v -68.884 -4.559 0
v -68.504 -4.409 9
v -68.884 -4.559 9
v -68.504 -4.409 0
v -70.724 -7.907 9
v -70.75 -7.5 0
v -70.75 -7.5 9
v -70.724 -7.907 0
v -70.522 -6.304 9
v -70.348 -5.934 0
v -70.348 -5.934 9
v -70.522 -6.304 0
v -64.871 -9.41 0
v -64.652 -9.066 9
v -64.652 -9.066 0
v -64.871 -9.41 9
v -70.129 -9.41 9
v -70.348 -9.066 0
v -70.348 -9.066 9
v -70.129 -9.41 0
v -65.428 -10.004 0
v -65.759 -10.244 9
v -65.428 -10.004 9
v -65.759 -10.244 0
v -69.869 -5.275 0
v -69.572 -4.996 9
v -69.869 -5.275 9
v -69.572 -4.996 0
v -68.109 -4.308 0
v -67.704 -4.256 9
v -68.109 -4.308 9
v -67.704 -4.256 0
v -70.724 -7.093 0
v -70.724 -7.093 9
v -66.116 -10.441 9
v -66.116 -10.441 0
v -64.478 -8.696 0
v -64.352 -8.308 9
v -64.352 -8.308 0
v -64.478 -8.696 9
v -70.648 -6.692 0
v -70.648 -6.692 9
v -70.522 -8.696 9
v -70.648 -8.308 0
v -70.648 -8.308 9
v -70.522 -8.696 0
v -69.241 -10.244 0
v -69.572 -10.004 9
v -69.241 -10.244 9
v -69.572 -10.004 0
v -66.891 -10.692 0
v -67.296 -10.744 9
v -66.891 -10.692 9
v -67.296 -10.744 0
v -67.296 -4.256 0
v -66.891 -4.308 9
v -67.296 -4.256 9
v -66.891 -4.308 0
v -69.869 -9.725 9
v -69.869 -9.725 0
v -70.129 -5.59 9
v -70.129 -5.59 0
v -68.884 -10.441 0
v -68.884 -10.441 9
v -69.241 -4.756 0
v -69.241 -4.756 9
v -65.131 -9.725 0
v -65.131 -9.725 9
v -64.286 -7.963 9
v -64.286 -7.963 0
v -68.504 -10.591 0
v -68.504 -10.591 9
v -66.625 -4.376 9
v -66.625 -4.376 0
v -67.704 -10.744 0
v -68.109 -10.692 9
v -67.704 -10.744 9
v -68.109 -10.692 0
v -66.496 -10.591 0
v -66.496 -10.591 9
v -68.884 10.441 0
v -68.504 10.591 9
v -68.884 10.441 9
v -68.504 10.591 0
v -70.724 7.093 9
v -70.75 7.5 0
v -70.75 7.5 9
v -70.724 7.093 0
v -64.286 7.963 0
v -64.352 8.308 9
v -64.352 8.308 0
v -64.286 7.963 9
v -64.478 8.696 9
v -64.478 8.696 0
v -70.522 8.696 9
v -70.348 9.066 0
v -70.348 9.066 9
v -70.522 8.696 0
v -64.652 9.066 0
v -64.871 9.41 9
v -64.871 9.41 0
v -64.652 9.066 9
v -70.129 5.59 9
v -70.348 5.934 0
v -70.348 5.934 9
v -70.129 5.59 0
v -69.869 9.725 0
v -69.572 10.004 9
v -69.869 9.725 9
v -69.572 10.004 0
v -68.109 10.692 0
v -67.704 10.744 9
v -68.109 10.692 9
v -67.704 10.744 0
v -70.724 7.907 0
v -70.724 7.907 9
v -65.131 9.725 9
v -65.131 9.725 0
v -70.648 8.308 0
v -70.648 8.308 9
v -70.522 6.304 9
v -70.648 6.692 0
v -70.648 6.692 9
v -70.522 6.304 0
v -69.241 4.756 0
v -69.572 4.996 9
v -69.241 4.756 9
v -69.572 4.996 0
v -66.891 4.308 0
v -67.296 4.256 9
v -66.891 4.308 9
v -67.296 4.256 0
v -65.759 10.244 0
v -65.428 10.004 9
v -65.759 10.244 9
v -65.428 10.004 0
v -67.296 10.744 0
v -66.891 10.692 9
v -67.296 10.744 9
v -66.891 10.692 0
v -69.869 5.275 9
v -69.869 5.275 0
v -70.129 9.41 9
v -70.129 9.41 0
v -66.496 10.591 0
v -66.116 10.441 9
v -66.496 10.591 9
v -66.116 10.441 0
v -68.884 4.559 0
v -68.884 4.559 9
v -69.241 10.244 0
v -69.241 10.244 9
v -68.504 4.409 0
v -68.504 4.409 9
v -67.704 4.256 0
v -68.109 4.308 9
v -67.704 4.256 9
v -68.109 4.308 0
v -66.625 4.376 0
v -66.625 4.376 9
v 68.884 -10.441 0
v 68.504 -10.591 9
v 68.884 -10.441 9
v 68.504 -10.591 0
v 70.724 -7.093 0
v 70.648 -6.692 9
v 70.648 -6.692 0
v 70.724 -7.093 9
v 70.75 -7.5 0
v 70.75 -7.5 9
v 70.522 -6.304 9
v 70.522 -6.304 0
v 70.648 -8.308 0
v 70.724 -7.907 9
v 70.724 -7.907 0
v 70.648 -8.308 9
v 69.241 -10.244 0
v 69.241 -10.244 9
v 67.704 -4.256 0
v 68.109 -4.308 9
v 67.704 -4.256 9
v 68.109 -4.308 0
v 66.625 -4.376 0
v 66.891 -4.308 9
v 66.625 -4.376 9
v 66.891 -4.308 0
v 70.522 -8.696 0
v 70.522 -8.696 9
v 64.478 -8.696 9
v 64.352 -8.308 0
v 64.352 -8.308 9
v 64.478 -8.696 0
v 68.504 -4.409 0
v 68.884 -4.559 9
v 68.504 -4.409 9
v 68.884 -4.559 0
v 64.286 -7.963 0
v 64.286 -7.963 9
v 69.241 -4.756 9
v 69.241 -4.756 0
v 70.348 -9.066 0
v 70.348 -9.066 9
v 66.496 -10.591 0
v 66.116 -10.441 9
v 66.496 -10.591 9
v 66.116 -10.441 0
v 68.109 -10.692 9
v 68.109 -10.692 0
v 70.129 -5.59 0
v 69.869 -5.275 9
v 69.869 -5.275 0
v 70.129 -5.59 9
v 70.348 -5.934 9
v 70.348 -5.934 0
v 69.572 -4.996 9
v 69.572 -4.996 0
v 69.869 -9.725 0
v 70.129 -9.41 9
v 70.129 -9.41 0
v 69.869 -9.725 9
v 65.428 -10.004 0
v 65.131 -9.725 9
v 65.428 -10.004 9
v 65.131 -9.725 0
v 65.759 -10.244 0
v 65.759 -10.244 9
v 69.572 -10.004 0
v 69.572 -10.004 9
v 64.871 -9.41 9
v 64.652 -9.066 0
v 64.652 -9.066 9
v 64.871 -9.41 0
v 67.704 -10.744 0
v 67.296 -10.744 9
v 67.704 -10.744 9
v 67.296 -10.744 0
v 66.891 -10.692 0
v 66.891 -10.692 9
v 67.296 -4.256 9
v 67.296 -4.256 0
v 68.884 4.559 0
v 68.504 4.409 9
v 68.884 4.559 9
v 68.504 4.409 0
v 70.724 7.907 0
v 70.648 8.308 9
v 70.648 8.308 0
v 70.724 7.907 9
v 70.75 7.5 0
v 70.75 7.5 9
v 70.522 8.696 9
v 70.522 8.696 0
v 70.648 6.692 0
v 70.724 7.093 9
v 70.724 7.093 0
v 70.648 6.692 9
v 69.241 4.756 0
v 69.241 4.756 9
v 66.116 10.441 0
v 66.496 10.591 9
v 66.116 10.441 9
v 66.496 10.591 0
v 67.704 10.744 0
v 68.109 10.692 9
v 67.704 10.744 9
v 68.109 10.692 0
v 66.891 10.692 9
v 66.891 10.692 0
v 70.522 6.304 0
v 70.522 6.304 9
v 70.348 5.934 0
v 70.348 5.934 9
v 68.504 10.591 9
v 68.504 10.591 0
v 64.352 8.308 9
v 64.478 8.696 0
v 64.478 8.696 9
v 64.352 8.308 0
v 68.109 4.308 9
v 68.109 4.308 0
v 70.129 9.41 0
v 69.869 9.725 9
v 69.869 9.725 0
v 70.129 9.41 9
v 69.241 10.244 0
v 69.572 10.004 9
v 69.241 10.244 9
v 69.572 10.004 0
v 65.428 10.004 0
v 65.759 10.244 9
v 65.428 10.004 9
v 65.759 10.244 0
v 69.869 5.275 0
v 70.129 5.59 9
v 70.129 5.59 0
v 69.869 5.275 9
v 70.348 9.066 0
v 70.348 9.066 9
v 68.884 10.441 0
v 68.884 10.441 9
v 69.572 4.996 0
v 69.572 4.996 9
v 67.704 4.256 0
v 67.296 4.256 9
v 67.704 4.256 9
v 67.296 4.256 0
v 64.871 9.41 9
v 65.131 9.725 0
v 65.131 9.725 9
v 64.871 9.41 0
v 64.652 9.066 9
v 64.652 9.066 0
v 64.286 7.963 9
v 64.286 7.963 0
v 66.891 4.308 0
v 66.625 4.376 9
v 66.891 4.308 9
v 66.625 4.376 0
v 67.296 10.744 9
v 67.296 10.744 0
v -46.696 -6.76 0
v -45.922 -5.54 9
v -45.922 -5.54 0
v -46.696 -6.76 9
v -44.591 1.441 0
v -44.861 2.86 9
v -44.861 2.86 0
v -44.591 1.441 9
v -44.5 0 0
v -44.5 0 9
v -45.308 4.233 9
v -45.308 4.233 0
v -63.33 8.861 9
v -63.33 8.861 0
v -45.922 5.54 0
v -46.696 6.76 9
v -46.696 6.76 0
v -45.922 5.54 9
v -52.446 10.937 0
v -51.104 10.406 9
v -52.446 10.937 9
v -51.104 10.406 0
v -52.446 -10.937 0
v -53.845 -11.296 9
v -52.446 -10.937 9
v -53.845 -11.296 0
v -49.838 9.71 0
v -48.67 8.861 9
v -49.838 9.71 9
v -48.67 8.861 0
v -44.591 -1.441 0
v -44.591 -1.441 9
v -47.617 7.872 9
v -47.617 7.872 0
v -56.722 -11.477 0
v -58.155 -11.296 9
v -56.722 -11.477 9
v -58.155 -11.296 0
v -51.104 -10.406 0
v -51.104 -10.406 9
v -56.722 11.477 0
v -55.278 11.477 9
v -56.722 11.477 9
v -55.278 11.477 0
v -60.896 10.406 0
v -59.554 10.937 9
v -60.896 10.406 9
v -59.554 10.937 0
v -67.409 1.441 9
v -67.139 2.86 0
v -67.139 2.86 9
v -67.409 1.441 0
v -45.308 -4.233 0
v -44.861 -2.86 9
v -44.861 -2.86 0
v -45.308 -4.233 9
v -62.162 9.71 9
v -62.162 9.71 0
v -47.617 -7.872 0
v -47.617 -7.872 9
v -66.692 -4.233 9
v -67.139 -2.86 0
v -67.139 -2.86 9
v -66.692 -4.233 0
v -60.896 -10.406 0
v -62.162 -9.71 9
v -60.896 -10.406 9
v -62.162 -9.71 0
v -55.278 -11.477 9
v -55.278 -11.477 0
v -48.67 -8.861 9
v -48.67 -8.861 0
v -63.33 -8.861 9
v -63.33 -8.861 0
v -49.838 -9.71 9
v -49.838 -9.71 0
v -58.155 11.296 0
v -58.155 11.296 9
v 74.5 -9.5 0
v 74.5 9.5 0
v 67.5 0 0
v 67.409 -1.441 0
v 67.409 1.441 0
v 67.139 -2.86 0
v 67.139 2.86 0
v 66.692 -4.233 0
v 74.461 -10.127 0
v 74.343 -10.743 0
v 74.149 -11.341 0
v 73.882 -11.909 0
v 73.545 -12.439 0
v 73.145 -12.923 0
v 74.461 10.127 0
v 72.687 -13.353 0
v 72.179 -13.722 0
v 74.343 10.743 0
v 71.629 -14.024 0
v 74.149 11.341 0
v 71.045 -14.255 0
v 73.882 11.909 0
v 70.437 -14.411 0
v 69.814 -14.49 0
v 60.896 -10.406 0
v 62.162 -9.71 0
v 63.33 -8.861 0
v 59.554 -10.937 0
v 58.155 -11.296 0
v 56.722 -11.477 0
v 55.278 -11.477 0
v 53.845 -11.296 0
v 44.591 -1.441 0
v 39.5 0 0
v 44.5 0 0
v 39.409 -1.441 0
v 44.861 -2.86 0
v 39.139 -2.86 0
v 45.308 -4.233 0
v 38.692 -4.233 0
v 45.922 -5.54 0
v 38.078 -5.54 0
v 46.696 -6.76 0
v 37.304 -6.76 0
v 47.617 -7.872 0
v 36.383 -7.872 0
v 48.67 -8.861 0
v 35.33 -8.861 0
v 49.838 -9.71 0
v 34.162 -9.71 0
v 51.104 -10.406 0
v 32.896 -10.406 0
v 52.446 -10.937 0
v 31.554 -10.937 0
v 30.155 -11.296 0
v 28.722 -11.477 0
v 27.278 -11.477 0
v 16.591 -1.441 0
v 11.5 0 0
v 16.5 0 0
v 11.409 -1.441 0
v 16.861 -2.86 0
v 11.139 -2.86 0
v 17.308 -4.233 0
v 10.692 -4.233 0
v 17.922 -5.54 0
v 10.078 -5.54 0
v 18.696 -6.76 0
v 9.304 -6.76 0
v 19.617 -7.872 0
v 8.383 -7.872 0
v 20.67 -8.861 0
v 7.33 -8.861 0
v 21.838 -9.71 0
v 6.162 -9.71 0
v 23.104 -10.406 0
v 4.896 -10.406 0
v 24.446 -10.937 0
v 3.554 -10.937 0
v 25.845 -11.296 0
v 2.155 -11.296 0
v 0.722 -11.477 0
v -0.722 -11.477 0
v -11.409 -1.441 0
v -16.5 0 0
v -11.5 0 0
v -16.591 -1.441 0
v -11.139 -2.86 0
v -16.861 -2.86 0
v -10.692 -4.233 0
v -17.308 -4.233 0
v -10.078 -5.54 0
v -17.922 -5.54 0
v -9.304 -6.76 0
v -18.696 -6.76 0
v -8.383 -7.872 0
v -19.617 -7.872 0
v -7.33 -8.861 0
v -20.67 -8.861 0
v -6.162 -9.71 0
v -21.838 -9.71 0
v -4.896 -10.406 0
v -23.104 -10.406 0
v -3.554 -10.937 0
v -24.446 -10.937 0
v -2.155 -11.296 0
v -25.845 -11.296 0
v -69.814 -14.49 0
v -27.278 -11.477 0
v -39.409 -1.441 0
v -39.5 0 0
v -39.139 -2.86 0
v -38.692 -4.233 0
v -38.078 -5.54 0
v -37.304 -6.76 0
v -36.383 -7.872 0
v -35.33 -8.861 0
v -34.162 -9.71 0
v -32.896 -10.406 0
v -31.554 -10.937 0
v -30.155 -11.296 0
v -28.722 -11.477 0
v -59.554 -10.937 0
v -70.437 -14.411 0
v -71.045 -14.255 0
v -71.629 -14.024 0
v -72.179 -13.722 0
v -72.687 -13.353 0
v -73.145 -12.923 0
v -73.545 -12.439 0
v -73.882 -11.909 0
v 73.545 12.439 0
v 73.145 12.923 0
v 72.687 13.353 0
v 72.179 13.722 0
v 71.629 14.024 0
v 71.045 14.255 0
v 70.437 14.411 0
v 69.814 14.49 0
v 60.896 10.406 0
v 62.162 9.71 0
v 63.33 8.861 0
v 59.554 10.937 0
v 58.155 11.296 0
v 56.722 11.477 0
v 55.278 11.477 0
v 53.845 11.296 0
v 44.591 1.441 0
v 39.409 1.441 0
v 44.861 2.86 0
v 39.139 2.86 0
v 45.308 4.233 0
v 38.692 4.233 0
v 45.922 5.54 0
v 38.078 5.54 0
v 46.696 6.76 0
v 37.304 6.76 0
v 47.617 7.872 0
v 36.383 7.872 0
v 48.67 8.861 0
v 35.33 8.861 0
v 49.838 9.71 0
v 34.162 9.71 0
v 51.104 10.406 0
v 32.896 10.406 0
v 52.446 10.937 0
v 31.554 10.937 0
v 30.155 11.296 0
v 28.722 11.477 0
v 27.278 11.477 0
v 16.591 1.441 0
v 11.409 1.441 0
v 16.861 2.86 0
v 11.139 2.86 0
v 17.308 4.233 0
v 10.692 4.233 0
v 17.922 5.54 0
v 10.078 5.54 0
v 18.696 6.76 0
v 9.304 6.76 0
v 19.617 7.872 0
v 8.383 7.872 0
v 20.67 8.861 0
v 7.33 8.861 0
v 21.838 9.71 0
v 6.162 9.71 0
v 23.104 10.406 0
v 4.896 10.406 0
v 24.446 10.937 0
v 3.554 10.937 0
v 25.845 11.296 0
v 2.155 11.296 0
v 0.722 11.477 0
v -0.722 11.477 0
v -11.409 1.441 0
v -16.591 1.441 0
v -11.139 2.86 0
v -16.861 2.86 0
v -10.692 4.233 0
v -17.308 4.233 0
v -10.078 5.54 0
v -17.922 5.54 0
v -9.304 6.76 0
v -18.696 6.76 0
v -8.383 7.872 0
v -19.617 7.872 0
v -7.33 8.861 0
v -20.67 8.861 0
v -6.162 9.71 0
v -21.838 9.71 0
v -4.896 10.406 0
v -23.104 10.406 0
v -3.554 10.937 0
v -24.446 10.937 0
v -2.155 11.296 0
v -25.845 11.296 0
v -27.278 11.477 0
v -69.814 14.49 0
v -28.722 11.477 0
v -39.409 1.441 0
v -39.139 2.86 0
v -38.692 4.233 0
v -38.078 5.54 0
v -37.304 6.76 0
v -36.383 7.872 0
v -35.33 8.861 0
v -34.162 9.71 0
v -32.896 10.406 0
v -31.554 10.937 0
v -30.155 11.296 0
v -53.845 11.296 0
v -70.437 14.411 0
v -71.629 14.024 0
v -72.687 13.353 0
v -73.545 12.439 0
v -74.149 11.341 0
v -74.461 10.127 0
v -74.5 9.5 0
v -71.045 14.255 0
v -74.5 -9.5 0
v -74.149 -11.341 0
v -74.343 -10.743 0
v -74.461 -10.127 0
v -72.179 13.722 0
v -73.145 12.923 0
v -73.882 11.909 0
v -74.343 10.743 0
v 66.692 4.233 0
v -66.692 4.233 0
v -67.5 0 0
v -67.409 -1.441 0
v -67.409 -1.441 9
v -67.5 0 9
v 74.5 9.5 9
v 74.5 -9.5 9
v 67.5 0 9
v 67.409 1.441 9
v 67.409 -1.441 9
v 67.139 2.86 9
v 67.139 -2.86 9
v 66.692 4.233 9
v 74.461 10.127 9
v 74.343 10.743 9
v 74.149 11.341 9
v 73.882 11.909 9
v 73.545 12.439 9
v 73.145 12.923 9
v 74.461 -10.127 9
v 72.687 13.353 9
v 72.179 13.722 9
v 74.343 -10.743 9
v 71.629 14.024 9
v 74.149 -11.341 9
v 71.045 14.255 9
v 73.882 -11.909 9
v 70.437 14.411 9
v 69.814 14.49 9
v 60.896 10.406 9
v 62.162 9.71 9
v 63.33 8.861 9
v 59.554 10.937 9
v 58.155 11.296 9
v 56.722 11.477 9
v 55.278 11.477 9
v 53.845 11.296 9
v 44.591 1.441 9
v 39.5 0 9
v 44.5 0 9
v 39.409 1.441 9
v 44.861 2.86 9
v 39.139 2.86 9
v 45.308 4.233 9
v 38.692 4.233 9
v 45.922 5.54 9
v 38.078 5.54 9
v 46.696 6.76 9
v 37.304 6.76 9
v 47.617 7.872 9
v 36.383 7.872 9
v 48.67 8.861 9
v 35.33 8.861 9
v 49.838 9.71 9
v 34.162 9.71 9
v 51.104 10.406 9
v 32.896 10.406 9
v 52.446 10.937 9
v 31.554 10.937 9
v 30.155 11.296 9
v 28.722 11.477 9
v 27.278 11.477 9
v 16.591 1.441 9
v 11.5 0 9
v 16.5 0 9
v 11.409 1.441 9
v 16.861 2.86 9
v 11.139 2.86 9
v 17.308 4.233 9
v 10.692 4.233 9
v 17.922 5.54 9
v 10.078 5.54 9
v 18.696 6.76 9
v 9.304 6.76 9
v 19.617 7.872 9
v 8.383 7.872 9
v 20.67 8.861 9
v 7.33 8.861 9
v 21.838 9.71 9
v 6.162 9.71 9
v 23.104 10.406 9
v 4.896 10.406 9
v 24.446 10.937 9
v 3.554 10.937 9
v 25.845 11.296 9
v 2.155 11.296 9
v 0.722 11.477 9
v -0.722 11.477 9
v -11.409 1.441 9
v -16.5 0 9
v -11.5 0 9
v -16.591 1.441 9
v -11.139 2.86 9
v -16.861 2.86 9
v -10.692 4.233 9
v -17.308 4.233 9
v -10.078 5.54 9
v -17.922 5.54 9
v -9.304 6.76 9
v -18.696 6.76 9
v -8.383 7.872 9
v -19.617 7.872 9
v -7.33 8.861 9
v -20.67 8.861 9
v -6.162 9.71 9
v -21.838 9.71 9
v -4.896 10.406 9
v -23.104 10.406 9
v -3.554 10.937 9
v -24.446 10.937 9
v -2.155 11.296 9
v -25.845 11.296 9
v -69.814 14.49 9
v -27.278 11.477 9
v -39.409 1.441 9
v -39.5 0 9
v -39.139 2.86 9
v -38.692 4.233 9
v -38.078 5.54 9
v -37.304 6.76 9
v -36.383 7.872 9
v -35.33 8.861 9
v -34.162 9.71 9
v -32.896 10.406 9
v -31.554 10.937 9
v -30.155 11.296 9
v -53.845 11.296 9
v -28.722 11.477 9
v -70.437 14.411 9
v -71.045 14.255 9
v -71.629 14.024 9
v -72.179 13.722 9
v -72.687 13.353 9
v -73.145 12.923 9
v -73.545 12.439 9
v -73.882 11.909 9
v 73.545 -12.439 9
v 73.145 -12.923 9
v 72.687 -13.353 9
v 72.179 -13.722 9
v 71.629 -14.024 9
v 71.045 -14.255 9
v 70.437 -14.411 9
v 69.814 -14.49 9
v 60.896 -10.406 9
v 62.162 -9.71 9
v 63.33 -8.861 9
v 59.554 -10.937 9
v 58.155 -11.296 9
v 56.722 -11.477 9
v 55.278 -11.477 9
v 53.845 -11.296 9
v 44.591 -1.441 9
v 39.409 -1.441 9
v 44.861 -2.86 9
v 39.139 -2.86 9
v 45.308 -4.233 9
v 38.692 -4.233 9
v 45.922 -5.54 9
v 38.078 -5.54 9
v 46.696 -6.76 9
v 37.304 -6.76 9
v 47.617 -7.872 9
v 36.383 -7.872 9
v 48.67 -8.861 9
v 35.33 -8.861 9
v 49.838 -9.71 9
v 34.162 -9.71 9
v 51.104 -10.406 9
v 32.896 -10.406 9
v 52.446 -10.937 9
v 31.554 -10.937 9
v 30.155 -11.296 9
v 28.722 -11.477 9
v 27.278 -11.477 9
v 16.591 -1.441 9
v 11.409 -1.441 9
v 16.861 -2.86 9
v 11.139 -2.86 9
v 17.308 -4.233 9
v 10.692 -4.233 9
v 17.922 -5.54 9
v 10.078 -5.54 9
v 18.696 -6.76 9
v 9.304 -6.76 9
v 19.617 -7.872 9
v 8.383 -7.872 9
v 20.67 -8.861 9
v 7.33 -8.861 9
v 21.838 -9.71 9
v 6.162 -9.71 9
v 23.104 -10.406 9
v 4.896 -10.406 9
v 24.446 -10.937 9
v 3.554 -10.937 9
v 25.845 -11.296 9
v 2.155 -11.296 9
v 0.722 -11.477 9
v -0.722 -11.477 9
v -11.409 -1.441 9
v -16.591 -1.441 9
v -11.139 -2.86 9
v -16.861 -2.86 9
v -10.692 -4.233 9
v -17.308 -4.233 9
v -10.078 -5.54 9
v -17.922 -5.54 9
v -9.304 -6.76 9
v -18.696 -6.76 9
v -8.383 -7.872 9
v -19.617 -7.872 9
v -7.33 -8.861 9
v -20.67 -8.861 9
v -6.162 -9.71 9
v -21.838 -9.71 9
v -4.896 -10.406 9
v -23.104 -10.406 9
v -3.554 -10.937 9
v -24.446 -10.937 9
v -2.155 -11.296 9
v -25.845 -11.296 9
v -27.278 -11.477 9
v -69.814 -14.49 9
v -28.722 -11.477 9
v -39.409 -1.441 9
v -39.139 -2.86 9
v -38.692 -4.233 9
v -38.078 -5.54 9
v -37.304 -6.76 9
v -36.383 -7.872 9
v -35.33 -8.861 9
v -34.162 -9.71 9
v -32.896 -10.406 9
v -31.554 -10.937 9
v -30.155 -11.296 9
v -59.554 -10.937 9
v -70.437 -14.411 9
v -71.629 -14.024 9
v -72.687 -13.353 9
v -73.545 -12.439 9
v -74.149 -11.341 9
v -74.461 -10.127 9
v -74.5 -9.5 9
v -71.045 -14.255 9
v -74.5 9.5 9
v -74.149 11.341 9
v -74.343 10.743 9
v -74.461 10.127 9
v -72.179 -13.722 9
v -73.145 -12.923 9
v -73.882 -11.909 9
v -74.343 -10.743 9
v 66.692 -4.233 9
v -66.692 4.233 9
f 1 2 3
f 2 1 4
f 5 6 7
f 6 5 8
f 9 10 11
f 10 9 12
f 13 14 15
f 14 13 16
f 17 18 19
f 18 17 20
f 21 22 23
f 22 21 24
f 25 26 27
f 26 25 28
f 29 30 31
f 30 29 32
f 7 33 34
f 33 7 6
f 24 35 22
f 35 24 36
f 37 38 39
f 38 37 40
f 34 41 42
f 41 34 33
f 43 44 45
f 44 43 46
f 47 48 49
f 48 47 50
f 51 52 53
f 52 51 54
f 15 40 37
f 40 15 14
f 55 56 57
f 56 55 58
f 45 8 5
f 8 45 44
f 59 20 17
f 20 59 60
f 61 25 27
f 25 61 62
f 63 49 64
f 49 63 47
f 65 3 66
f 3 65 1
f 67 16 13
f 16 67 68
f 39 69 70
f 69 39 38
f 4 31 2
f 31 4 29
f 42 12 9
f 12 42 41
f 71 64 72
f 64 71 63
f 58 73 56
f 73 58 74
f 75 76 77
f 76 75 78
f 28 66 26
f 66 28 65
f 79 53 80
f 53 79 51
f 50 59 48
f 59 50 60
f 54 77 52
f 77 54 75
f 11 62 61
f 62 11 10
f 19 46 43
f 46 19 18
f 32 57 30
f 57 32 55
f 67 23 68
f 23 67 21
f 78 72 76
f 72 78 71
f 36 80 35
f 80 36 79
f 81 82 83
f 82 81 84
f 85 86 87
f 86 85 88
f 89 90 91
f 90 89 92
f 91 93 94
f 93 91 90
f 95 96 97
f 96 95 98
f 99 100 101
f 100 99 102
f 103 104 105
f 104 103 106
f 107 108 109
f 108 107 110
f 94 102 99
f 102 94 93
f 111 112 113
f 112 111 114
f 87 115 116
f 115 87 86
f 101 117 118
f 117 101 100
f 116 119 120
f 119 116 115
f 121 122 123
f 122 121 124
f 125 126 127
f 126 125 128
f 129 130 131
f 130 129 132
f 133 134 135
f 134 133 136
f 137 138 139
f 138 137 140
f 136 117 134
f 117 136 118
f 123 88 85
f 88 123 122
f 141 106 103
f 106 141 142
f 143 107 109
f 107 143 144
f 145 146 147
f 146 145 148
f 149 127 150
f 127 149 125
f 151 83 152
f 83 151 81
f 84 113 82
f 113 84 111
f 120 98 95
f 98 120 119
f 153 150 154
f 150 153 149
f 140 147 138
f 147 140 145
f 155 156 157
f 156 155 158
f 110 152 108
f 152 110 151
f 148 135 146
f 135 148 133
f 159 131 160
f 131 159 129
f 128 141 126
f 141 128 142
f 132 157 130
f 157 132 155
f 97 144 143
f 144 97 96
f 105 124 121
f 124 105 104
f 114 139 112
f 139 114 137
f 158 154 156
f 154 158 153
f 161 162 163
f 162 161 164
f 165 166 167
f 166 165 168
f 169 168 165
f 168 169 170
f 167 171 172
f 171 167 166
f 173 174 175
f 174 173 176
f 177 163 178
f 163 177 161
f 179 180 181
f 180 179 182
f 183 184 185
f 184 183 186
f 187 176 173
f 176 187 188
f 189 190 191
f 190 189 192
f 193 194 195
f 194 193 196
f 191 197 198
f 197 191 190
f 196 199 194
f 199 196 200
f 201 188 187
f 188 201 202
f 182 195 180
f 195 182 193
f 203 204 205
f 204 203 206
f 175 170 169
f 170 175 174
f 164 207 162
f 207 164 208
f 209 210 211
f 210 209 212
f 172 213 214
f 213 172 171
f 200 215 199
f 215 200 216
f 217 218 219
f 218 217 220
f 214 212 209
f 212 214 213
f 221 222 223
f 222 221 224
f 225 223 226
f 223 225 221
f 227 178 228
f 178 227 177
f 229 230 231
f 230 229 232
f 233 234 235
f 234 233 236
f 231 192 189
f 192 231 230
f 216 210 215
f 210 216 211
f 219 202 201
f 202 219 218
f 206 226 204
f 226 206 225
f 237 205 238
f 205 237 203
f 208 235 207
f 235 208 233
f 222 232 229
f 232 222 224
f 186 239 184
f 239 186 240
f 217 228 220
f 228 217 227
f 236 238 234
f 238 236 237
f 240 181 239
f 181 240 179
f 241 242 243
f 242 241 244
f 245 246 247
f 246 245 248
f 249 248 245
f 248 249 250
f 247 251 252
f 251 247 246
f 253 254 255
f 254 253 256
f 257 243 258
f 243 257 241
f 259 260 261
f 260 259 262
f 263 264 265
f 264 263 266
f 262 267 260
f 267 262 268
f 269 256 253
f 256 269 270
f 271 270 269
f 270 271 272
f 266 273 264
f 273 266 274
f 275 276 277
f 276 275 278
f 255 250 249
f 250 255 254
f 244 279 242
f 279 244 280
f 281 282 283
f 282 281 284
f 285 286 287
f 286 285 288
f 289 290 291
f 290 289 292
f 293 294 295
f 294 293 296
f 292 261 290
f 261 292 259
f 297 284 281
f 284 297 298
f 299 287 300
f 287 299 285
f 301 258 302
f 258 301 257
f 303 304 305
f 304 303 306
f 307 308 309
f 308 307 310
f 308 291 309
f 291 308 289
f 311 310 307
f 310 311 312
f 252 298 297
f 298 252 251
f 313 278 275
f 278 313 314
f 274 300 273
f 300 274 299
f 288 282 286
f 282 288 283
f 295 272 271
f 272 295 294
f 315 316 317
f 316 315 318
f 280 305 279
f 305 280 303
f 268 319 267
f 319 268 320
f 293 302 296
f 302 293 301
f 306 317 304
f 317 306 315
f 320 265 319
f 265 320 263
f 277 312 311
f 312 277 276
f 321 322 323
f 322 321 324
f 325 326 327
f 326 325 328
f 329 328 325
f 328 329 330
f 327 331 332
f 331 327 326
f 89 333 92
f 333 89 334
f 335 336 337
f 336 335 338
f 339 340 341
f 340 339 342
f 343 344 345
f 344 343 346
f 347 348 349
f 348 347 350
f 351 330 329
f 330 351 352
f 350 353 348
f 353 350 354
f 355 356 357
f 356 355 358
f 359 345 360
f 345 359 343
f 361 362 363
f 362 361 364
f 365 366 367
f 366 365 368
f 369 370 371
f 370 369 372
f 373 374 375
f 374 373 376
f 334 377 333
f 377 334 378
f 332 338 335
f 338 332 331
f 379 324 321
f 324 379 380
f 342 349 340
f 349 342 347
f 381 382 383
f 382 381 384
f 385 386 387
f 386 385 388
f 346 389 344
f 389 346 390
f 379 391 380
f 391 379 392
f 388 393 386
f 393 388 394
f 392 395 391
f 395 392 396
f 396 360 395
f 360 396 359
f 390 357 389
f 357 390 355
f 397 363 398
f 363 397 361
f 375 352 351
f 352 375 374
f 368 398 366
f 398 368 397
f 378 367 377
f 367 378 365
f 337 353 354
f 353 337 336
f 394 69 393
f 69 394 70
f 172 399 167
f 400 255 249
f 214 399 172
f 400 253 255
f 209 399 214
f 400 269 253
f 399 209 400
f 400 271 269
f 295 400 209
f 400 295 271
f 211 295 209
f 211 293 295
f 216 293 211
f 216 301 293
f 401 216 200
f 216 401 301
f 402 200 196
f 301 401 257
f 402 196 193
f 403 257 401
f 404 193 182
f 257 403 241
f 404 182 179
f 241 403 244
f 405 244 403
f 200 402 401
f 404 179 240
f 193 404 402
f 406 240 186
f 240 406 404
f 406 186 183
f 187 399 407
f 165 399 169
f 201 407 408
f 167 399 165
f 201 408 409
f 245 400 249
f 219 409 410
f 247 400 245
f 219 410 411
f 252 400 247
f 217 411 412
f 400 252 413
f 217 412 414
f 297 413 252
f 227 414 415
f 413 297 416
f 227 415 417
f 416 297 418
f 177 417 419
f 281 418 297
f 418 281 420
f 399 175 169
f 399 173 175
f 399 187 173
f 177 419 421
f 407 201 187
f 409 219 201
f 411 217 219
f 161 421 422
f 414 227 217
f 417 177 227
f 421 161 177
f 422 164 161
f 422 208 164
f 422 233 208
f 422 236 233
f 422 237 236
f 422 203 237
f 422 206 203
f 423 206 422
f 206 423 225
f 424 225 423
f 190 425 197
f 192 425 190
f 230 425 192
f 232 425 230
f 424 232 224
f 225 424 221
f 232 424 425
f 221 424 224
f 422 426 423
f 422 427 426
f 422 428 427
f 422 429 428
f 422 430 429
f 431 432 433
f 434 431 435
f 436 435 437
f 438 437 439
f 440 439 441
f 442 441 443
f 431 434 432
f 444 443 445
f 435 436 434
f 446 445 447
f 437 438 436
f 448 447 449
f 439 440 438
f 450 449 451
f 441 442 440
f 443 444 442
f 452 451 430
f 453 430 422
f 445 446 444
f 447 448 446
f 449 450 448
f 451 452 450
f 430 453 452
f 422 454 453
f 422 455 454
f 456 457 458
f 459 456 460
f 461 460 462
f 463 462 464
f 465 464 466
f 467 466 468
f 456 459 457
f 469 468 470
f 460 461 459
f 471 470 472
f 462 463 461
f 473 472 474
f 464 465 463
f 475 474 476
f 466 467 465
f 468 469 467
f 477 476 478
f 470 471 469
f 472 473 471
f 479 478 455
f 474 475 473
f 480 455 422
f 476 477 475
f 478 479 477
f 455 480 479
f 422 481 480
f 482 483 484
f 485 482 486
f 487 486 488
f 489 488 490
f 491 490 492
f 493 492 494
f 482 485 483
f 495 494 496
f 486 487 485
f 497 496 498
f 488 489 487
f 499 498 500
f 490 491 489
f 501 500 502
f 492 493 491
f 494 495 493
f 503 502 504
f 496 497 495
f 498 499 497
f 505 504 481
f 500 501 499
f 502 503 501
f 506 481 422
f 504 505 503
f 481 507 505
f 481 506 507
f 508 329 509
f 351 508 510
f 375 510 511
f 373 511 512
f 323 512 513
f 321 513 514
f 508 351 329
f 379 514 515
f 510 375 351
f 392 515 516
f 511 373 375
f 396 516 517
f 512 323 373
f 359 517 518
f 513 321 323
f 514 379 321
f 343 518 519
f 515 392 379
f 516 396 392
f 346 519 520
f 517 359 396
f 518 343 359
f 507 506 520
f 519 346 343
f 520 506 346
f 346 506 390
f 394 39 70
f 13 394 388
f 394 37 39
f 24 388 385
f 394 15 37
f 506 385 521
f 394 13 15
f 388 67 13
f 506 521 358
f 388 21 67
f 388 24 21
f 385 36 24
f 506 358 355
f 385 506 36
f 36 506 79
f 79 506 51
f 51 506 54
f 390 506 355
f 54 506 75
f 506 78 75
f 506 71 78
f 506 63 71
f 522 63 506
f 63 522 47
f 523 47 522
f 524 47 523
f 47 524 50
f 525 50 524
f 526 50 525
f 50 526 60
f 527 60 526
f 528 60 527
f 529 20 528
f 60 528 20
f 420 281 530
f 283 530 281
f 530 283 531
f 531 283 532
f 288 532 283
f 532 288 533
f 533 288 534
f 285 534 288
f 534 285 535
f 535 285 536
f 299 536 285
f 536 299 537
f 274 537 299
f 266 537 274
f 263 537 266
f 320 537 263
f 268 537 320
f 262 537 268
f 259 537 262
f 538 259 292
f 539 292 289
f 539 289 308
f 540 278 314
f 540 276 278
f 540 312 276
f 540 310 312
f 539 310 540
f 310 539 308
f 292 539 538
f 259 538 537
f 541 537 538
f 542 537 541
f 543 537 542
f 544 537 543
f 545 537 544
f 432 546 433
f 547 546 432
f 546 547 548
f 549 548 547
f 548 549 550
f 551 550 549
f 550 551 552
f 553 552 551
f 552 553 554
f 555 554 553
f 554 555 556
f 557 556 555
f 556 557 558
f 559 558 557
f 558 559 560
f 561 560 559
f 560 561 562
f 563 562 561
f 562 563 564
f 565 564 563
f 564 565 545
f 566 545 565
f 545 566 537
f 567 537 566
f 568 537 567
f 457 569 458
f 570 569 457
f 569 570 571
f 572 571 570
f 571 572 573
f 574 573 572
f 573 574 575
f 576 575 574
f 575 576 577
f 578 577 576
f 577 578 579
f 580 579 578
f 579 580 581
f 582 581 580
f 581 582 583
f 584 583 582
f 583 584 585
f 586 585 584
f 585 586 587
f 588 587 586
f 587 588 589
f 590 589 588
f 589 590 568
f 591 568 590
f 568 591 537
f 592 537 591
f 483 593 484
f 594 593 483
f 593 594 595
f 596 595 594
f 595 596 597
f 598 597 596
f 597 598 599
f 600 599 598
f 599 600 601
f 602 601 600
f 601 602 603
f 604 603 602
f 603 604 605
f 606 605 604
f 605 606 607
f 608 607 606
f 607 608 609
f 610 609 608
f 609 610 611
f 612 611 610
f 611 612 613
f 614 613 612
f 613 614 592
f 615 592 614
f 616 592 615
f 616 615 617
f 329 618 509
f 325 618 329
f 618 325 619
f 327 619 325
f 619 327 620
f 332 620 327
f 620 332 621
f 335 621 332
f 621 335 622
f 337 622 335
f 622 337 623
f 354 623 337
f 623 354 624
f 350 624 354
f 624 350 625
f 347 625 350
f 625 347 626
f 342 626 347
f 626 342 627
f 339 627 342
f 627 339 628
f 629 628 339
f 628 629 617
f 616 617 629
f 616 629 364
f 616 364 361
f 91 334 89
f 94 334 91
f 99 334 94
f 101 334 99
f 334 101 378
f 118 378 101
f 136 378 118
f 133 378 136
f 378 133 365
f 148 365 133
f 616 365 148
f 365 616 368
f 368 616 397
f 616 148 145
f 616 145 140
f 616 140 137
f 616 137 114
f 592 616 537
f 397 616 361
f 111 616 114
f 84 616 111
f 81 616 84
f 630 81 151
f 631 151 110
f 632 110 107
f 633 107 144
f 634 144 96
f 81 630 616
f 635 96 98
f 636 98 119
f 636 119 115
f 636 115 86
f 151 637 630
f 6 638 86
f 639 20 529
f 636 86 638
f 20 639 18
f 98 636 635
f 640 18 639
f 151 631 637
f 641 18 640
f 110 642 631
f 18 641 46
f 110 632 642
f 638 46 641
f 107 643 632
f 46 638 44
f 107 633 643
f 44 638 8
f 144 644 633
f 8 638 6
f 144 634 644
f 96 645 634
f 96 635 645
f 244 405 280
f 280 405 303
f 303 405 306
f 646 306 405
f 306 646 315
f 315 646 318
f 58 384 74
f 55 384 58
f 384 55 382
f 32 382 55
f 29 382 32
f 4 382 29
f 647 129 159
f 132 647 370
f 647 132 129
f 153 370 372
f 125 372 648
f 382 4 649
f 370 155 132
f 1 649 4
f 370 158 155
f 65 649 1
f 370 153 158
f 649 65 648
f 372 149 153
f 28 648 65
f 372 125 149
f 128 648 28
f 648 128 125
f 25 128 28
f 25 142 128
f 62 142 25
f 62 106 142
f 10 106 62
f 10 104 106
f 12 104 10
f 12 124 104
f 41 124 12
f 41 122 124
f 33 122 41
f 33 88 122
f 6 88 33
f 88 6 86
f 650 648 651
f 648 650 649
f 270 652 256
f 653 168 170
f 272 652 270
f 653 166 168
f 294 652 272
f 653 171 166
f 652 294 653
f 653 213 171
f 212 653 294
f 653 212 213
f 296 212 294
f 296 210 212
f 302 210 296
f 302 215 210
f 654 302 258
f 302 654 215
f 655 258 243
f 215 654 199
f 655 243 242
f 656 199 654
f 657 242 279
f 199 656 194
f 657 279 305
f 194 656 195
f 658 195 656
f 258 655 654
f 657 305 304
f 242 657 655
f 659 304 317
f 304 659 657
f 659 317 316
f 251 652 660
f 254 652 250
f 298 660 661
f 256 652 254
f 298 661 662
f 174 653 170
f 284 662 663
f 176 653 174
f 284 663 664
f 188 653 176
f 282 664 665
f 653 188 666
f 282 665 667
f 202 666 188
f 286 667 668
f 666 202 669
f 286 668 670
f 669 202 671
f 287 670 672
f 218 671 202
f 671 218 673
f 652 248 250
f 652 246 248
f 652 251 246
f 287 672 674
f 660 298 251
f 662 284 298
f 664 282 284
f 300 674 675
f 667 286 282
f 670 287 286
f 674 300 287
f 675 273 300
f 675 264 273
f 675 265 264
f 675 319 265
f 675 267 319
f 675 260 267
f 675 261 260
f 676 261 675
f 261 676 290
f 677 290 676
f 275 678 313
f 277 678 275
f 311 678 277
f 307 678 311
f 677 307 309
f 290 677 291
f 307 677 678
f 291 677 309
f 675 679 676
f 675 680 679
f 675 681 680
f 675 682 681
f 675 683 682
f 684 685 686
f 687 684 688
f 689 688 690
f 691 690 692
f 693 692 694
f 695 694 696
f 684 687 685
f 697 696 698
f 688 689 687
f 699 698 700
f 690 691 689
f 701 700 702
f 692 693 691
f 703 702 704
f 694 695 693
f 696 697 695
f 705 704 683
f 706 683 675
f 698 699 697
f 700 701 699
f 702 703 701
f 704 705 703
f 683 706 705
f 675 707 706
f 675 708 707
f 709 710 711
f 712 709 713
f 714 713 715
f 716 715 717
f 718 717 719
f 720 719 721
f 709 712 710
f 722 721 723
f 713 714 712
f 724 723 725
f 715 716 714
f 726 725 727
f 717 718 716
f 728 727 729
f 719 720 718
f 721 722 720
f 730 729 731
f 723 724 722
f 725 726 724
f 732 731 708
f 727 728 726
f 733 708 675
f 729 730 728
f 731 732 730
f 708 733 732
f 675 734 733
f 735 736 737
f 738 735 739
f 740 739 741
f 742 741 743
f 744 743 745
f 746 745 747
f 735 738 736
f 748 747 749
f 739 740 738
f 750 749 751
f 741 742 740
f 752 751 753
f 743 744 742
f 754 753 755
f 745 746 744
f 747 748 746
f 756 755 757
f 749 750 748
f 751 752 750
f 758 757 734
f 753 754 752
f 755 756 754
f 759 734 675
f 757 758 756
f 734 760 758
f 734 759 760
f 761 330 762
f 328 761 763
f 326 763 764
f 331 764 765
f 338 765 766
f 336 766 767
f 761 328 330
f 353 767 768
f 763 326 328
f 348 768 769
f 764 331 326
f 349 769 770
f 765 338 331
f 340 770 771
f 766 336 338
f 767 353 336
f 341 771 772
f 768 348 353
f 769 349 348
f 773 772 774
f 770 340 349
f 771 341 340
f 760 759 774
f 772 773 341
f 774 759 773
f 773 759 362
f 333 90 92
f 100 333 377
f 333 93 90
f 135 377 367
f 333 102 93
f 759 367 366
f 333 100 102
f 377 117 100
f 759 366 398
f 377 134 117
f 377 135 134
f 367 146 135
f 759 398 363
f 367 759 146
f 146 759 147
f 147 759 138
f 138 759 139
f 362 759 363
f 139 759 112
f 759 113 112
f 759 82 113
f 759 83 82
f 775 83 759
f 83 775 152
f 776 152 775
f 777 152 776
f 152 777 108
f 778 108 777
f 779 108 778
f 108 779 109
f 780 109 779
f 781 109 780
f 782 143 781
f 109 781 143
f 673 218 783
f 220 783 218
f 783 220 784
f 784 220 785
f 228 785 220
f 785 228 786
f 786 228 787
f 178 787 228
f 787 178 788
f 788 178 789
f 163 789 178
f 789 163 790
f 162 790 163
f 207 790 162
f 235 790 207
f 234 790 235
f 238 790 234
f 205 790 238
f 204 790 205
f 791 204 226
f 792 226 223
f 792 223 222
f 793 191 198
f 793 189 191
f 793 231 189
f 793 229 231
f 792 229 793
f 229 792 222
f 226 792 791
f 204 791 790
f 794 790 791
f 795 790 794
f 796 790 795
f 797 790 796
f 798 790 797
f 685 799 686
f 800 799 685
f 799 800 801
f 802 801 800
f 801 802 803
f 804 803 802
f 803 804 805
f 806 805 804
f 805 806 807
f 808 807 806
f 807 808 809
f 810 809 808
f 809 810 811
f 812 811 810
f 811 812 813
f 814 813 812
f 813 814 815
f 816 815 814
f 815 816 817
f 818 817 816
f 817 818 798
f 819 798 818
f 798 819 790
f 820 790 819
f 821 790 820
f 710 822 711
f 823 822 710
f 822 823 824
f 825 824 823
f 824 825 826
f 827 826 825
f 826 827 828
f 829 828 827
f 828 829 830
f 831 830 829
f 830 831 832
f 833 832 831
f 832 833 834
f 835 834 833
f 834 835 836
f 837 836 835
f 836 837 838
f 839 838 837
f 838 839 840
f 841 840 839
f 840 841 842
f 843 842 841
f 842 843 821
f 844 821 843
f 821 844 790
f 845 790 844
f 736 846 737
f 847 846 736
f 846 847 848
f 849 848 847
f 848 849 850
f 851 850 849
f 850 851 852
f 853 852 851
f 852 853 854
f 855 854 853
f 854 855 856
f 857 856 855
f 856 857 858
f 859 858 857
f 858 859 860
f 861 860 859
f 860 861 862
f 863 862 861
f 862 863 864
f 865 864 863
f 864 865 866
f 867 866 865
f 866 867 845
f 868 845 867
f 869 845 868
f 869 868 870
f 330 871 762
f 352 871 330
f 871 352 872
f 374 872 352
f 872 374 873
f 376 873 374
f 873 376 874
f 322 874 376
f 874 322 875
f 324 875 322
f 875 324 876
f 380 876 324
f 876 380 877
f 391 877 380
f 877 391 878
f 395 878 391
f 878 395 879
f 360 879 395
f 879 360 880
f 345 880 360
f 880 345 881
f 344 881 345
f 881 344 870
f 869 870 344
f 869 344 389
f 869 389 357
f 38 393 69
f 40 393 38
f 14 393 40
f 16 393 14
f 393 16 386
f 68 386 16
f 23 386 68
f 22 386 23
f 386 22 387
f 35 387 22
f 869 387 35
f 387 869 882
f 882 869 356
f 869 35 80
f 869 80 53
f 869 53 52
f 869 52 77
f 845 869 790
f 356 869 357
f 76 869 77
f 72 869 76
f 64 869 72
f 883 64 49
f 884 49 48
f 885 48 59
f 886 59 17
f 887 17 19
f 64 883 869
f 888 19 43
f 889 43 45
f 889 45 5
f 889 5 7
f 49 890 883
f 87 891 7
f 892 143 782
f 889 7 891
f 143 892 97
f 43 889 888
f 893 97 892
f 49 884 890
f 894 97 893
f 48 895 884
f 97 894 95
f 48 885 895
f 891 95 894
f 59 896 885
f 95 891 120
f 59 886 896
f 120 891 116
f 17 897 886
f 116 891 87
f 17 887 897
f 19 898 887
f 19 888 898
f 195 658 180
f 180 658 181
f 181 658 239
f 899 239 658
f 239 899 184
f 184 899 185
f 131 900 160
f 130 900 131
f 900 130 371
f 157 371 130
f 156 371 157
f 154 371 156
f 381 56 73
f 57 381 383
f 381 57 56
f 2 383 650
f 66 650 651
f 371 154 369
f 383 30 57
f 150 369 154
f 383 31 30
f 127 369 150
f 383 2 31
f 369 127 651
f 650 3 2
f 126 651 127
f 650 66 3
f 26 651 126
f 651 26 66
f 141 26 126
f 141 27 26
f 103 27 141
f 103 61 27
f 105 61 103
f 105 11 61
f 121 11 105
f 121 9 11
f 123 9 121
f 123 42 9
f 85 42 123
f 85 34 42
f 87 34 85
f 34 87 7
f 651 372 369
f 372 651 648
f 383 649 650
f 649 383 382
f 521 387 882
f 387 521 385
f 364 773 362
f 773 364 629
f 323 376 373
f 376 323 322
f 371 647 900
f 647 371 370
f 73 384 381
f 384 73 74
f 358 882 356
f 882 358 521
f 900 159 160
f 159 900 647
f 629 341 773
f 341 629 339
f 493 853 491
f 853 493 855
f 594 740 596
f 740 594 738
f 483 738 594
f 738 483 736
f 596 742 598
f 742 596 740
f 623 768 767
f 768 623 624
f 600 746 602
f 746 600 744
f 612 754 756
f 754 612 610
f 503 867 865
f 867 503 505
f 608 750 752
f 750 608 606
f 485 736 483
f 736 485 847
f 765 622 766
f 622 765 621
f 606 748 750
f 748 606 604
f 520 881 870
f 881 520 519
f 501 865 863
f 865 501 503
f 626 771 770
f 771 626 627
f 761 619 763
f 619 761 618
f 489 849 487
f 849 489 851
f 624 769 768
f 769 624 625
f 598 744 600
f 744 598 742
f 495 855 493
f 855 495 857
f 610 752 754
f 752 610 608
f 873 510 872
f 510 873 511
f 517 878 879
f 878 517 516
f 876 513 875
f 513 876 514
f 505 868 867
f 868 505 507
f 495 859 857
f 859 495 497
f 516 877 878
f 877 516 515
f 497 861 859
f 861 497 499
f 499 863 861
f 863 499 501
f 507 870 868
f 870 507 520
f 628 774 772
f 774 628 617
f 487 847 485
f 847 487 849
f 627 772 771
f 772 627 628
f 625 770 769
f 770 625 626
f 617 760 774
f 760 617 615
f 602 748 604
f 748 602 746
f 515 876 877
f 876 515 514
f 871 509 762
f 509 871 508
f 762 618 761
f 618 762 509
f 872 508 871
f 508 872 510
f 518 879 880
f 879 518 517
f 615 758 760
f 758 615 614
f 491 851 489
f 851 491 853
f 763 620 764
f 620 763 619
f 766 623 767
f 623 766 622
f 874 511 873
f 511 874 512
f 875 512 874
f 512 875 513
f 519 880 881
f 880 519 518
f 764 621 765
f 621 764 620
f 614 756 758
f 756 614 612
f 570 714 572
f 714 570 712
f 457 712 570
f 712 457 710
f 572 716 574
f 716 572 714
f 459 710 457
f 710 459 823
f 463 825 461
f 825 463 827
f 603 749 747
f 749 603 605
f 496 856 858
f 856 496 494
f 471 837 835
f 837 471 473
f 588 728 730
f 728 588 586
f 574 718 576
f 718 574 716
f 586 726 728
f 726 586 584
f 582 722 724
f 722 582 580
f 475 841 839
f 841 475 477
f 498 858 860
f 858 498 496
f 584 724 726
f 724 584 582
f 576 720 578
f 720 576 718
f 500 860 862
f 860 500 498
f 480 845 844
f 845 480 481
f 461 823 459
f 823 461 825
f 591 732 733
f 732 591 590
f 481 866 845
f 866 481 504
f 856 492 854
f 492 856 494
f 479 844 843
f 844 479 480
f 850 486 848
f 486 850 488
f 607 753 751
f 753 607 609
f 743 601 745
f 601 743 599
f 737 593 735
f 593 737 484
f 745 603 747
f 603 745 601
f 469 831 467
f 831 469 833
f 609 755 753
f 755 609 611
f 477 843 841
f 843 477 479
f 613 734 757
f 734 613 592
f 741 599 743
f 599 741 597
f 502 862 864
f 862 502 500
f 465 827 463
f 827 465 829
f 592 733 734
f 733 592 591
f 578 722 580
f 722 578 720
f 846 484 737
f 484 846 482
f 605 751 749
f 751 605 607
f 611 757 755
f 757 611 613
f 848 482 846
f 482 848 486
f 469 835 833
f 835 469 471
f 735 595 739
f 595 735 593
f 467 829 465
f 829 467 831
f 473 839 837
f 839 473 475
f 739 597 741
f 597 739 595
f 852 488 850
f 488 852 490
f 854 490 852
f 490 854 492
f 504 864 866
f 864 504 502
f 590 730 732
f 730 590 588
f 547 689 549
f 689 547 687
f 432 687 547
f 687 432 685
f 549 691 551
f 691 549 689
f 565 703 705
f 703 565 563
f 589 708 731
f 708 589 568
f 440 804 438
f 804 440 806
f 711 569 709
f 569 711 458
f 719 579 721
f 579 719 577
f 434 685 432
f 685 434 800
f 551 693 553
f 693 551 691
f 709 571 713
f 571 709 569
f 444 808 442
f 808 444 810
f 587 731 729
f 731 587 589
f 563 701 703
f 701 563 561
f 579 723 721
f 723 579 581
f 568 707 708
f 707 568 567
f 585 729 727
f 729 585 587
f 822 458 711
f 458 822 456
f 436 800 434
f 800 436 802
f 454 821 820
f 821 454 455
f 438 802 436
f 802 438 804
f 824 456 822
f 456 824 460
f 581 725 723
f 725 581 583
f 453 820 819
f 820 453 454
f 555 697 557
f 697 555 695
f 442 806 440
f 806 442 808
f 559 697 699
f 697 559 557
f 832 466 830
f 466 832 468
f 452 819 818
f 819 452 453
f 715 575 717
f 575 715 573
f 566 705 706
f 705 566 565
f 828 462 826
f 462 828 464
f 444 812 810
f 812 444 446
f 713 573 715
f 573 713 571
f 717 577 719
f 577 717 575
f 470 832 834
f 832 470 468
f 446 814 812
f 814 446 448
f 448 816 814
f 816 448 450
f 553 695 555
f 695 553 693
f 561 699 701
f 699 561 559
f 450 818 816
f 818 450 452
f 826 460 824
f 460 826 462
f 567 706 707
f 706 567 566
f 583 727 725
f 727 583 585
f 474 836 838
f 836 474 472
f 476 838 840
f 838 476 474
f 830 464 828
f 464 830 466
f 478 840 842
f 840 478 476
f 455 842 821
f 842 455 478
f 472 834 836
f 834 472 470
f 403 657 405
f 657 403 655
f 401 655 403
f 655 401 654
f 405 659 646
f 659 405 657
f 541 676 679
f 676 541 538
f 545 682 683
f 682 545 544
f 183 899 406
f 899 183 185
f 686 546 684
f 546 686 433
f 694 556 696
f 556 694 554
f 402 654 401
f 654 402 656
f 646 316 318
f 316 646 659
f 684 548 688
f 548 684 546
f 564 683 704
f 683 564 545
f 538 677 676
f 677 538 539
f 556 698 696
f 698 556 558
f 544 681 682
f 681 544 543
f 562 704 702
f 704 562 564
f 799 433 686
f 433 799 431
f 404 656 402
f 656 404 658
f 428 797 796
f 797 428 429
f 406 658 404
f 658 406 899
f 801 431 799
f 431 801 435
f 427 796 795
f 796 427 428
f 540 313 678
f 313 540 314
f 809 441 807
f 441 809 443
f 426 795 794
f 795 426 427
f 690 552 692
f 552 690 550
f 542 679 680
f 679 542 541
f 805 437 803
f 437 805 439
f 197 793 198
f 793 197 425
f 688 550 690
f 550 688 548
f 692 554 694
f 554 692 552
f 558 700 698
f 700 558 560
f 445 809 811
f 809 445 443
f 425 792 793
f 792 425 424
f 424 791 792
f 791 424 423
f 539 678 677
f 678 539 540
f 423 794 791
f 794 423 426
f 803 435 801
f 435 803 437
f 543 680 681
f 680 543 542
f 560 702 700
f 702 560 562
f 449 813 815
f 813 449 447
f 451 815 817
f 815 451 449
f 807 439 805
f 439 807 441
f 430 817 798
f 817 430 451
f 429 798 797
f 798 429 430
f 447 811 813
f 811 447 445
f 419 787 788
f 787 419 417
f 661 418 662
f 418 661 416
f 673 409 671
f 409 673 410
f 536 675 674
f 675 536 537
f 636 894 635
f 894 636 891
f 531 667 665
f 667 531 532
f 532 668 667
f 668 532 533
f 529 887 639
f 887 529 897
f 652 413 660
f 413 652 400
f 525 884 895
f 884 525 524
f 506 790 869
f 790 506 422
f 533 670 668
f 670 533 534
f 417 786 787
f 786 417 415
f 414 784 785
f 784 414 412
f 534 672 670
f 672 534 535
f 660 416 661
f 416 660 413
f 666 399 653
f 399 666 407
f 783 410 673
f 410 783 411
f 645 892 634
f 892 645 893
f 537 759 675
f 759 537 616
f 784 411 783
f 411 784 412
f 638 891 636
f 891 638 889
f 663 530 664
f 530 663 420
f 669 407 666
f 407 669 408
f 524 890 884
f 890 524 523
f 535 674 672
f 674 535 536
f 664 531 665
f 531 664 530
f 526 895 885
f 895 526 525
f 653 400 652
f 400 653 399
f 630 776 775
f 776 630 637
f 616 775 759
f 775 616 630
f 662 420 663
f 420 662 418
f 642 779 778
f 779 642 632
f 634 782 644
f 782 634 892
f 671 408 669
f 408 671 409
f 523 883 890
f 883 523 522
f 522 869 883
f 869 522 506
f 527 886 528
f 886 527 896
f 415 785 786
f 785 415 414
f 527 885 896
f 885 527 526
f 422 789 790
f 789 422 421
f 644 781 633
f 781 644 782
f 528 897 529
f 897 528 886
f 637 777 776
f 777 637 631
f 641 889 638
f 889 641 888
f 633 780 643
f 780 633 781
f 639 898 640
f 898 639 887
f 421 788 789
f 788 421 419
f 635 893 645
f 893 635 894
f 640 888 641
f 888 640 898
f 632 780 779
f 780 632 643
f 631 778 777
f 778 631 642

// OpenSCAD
$fn = 50;


difference() {
	union() {
		hull() {
			translate(v = [-69.5000000000, 9.5000000000, 0]) {
				cylinder(h = 9, r = 5);
			}
			translate(v = [69.5000000000, 9.5000000000, 0]) {
				cylinder(h = 9, r = 5);
			}
			translate(v = [-69.5000000000, -9.5000000000, 0]) {
				cylinder(h = 9, r = 5);
			}
			translate(v = [69.5000000000, -9.5000000000, 0]) {
				cylinder(h = 9, r = 5);
			}
		}
	}
	union() {
		#translate(v = [-67.5000000000, -7.5000000000, -100.0000000000]) {
			cylinder(h = 200, r = 3.2500000000);
		}
		#translate(v = [-67.5000000000, 7.5000000000, -100.0000000000]) {
			cylinder(h = 200, r = 3.2500000000);
		}
		#translate(v = [67.5000000000, -7.5000000000, -100.0000000000]) {
			cylinder(h = 200, r = 3.2500000000);
		}
		#translate(v = [67.5000000000, 7.5000000000, -100.0000000000]) {
			cylinder(h = 200, r = 3.2500000000);
		}
		#translate(v = [-56.0000000000, 0, 0]) {
			cylinder(h = 9, r = 11.5000000000);
		}
		#translate(v = [-28.0000000000, 0, 0]) {
			cylinder(h = 9, r = 11.5000000000);
		}
		#cylinder(h = 9, r = 11.5000000000);
		#translate(v = [28.0000000000, 0, 0]) {
			cylinder(h = 9, r = 11.5000000000);
		}
		#translate(v = [56.0000000000, 0, 0]) {
			cylinder(h = 9, r = 11.5000000000);
		}
	}
}
